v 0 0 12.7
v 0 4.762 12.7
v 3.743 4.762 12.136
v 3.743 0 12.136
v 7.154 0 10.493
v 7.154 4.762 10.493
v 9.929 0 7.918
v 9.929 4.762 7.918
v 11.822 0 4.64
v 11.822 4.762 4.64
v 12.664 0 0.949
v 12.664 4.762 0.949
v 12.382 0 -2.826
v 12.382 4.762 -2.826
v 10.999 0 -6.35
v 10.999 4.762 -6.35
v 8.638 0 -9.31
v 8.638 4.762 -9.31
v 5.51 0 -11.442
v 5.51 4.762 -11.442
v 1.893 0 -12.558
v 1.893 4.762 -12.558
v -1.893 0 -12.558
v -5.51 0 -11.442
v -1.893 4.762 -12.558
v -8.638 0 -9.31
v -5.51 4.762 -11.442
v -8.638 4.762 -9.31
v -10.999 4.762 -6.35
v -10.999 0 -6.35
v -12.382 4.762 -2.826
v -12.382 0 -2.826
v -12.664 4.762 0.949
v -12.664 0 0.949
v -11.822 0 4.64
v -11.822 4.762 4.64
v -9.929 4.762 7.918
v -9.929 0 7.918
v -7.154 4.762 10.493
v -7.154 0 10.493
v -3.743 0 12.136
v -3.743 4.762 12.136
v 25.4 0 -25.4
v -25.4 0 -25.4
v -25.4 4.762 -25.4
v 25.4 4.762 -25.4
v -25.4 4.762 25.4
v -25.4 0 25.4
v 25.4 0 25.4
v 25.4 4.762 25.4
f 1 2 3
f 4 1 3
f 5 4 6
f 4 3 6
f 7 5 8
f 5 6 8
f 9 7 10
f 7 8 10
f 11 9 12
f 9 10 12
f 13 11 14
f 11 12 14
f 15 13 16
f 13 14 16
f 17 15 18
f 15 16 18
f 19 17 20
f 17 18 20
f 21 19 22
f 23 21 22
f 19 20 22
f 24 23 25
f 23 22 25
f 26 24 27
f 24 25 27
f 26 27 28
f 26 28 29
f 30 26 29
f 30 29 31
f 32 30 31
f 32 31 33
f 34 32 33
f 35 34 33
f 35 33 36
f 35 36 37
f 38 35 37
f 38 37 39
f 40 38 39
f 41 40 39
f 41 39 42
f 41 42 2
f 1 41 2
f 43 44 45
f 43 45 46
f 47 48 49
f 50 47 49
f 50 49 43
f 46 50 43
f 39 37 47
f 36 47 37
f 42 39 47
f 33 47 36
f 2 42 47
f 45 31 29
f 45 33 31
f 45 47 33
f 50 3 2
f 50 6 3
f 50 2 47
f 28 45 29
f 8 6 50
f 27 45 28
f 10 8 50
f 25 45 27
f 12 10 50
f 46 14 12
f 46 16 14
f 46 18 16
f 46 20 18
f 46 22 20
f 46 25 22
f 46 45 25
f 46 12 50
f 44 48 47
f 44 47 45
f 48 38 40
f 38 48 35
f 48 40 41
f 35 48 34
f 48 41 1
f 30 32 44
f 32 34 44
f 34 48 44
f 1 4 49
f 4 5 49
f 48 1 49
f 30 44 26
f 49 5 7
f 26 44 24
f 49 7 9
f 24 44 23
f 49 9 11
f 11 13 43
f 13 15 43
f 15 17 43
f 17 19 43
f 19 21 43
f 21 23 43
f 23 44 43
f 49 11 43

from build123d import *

# Parameters (mm, degrees)
SKETCH1_W           = 50.8
SKETCH1_H           = 50.8
BOSS_EXTRUDE1_DEPTH = 4.7625
CUT_EXTRUDE1_REACH  = 38.235
SKETCH2_R           = 12.7


with BuildPart() as part:
    # Sketch1 → Boss-Extrude1 (new body)
    with BuildSketch(Plane(origin=(0, 0, 0), x_dir=(1, 0, 0), z_dir=(0, 1, 0))):
        Rectangle(SKETCH1_W, SKETCH1_H)
    extrude(amount=BOSS_EXTRUDE1_DEPTH)

    # Sketch2 → Cut-Extrude1 (cut, up to next)
    with BuildSketch(Plane(origin=(0, 4.7625, 0), x_dir=(1, 0, 0), z_dir=(0, 1, 0)), mode=Mode.PRIVATE) as cut_extrude1_sk1:
        with Locations(Location((0, 0, 0), (0, 0, 270))):
            Circle(SKETCH2_R)
    cut_extrude1_tool1 = extrude(cut_extrude1_sk1.sketch, amount=-CUT_EXTRUDE1_REACH, mode=Mode.PRIVATE) & part.part
    add(cut_extrude1_tool1.solids().sort_by_distance((0, 4.7625, 0))[0], mode=Mode.SUBTRACT)


solid = part.part
